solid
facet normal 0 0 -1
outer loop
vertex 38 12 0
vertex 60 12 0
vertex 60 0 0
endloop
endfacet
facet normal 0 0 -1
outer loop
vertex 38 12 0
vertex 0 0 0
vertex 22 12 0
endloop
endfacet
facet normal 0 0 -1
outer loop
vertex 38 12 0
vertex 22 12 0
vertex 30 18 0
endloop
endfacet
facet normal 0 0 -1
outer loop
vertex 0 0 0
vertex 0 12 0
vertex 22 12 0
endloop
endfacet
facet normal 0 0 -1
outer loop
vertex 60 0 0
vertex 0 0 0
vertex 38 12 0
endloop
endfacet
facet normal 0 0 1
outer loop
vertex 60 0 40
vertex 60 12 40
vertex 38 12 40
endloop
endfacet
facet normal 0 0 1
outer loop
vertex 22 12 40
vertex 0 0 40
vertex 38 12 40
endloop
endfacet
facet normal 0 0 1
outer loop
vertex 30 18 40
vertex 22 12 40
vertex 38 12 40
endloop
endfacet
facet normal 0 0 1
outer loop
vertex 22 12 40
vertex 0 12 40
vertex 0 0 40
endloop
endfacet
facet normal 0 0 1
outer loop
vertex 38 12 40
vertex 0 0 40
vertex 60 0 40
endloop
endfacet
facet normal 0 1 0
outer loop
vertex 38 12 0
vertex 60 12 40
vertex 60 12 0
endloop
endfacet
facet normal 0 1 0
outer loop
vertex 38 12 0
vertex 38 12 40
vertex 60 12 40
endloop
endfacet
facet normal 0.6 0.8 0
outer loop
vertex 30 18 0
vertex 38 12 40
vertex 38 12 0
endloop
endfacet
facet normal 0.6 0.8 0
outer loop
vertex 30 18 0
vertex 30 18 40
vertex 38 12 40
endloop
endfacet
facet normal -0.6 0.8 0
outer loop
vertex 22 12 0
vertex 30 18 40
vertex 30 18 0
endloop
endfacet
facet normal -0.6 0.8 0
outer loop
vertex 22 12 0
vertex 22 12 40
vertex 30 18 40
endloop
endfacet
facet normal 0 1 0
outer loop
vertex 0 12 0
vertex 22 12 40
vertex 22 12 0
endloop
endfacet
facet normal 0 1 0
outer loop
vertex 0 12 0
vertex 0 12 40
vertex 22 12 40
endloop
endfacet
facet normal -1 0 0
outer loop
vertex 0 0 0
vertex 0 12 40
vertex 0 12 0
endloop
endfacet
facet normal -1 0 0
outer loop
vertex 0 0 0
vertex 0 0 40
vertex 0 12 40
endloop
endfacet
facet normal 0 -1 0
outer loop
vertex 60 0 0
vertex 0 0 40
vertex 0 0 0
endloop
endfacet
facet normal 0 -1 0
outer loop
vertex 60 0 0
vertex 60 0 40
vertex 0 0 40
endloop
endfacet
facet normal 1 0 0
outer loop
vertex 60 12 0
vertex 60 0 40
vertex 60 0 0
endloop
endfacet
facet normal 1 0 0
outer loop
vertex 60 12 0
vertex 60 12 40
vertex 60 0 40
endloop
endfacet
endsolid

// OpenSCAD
$fn = 32;

// ----------------------------------------------------------------------
// V guide rail: vrib, 60 mm wide
// ----------------------------------------------------------------------

// --- parameters (mm) ---
rail_w = 60;              // rail width, X
base_t = 12;              // base plate thickness
v_depth = 6;              // V feature depth / height
v_half_w = 8;             // half width of the V at the base face
plate_t = 40;             // rail length, Z (the extrusion height)

profile = [[0, 0], [60, 0], [60, 12], [38, 12], [30, 18], [22, 12], [0, 12]];  // primary outline, 7 points, counter clockwise

// --- the one profile operation ---
linear_extrude(height = plate_t) polygon(points = profile);
